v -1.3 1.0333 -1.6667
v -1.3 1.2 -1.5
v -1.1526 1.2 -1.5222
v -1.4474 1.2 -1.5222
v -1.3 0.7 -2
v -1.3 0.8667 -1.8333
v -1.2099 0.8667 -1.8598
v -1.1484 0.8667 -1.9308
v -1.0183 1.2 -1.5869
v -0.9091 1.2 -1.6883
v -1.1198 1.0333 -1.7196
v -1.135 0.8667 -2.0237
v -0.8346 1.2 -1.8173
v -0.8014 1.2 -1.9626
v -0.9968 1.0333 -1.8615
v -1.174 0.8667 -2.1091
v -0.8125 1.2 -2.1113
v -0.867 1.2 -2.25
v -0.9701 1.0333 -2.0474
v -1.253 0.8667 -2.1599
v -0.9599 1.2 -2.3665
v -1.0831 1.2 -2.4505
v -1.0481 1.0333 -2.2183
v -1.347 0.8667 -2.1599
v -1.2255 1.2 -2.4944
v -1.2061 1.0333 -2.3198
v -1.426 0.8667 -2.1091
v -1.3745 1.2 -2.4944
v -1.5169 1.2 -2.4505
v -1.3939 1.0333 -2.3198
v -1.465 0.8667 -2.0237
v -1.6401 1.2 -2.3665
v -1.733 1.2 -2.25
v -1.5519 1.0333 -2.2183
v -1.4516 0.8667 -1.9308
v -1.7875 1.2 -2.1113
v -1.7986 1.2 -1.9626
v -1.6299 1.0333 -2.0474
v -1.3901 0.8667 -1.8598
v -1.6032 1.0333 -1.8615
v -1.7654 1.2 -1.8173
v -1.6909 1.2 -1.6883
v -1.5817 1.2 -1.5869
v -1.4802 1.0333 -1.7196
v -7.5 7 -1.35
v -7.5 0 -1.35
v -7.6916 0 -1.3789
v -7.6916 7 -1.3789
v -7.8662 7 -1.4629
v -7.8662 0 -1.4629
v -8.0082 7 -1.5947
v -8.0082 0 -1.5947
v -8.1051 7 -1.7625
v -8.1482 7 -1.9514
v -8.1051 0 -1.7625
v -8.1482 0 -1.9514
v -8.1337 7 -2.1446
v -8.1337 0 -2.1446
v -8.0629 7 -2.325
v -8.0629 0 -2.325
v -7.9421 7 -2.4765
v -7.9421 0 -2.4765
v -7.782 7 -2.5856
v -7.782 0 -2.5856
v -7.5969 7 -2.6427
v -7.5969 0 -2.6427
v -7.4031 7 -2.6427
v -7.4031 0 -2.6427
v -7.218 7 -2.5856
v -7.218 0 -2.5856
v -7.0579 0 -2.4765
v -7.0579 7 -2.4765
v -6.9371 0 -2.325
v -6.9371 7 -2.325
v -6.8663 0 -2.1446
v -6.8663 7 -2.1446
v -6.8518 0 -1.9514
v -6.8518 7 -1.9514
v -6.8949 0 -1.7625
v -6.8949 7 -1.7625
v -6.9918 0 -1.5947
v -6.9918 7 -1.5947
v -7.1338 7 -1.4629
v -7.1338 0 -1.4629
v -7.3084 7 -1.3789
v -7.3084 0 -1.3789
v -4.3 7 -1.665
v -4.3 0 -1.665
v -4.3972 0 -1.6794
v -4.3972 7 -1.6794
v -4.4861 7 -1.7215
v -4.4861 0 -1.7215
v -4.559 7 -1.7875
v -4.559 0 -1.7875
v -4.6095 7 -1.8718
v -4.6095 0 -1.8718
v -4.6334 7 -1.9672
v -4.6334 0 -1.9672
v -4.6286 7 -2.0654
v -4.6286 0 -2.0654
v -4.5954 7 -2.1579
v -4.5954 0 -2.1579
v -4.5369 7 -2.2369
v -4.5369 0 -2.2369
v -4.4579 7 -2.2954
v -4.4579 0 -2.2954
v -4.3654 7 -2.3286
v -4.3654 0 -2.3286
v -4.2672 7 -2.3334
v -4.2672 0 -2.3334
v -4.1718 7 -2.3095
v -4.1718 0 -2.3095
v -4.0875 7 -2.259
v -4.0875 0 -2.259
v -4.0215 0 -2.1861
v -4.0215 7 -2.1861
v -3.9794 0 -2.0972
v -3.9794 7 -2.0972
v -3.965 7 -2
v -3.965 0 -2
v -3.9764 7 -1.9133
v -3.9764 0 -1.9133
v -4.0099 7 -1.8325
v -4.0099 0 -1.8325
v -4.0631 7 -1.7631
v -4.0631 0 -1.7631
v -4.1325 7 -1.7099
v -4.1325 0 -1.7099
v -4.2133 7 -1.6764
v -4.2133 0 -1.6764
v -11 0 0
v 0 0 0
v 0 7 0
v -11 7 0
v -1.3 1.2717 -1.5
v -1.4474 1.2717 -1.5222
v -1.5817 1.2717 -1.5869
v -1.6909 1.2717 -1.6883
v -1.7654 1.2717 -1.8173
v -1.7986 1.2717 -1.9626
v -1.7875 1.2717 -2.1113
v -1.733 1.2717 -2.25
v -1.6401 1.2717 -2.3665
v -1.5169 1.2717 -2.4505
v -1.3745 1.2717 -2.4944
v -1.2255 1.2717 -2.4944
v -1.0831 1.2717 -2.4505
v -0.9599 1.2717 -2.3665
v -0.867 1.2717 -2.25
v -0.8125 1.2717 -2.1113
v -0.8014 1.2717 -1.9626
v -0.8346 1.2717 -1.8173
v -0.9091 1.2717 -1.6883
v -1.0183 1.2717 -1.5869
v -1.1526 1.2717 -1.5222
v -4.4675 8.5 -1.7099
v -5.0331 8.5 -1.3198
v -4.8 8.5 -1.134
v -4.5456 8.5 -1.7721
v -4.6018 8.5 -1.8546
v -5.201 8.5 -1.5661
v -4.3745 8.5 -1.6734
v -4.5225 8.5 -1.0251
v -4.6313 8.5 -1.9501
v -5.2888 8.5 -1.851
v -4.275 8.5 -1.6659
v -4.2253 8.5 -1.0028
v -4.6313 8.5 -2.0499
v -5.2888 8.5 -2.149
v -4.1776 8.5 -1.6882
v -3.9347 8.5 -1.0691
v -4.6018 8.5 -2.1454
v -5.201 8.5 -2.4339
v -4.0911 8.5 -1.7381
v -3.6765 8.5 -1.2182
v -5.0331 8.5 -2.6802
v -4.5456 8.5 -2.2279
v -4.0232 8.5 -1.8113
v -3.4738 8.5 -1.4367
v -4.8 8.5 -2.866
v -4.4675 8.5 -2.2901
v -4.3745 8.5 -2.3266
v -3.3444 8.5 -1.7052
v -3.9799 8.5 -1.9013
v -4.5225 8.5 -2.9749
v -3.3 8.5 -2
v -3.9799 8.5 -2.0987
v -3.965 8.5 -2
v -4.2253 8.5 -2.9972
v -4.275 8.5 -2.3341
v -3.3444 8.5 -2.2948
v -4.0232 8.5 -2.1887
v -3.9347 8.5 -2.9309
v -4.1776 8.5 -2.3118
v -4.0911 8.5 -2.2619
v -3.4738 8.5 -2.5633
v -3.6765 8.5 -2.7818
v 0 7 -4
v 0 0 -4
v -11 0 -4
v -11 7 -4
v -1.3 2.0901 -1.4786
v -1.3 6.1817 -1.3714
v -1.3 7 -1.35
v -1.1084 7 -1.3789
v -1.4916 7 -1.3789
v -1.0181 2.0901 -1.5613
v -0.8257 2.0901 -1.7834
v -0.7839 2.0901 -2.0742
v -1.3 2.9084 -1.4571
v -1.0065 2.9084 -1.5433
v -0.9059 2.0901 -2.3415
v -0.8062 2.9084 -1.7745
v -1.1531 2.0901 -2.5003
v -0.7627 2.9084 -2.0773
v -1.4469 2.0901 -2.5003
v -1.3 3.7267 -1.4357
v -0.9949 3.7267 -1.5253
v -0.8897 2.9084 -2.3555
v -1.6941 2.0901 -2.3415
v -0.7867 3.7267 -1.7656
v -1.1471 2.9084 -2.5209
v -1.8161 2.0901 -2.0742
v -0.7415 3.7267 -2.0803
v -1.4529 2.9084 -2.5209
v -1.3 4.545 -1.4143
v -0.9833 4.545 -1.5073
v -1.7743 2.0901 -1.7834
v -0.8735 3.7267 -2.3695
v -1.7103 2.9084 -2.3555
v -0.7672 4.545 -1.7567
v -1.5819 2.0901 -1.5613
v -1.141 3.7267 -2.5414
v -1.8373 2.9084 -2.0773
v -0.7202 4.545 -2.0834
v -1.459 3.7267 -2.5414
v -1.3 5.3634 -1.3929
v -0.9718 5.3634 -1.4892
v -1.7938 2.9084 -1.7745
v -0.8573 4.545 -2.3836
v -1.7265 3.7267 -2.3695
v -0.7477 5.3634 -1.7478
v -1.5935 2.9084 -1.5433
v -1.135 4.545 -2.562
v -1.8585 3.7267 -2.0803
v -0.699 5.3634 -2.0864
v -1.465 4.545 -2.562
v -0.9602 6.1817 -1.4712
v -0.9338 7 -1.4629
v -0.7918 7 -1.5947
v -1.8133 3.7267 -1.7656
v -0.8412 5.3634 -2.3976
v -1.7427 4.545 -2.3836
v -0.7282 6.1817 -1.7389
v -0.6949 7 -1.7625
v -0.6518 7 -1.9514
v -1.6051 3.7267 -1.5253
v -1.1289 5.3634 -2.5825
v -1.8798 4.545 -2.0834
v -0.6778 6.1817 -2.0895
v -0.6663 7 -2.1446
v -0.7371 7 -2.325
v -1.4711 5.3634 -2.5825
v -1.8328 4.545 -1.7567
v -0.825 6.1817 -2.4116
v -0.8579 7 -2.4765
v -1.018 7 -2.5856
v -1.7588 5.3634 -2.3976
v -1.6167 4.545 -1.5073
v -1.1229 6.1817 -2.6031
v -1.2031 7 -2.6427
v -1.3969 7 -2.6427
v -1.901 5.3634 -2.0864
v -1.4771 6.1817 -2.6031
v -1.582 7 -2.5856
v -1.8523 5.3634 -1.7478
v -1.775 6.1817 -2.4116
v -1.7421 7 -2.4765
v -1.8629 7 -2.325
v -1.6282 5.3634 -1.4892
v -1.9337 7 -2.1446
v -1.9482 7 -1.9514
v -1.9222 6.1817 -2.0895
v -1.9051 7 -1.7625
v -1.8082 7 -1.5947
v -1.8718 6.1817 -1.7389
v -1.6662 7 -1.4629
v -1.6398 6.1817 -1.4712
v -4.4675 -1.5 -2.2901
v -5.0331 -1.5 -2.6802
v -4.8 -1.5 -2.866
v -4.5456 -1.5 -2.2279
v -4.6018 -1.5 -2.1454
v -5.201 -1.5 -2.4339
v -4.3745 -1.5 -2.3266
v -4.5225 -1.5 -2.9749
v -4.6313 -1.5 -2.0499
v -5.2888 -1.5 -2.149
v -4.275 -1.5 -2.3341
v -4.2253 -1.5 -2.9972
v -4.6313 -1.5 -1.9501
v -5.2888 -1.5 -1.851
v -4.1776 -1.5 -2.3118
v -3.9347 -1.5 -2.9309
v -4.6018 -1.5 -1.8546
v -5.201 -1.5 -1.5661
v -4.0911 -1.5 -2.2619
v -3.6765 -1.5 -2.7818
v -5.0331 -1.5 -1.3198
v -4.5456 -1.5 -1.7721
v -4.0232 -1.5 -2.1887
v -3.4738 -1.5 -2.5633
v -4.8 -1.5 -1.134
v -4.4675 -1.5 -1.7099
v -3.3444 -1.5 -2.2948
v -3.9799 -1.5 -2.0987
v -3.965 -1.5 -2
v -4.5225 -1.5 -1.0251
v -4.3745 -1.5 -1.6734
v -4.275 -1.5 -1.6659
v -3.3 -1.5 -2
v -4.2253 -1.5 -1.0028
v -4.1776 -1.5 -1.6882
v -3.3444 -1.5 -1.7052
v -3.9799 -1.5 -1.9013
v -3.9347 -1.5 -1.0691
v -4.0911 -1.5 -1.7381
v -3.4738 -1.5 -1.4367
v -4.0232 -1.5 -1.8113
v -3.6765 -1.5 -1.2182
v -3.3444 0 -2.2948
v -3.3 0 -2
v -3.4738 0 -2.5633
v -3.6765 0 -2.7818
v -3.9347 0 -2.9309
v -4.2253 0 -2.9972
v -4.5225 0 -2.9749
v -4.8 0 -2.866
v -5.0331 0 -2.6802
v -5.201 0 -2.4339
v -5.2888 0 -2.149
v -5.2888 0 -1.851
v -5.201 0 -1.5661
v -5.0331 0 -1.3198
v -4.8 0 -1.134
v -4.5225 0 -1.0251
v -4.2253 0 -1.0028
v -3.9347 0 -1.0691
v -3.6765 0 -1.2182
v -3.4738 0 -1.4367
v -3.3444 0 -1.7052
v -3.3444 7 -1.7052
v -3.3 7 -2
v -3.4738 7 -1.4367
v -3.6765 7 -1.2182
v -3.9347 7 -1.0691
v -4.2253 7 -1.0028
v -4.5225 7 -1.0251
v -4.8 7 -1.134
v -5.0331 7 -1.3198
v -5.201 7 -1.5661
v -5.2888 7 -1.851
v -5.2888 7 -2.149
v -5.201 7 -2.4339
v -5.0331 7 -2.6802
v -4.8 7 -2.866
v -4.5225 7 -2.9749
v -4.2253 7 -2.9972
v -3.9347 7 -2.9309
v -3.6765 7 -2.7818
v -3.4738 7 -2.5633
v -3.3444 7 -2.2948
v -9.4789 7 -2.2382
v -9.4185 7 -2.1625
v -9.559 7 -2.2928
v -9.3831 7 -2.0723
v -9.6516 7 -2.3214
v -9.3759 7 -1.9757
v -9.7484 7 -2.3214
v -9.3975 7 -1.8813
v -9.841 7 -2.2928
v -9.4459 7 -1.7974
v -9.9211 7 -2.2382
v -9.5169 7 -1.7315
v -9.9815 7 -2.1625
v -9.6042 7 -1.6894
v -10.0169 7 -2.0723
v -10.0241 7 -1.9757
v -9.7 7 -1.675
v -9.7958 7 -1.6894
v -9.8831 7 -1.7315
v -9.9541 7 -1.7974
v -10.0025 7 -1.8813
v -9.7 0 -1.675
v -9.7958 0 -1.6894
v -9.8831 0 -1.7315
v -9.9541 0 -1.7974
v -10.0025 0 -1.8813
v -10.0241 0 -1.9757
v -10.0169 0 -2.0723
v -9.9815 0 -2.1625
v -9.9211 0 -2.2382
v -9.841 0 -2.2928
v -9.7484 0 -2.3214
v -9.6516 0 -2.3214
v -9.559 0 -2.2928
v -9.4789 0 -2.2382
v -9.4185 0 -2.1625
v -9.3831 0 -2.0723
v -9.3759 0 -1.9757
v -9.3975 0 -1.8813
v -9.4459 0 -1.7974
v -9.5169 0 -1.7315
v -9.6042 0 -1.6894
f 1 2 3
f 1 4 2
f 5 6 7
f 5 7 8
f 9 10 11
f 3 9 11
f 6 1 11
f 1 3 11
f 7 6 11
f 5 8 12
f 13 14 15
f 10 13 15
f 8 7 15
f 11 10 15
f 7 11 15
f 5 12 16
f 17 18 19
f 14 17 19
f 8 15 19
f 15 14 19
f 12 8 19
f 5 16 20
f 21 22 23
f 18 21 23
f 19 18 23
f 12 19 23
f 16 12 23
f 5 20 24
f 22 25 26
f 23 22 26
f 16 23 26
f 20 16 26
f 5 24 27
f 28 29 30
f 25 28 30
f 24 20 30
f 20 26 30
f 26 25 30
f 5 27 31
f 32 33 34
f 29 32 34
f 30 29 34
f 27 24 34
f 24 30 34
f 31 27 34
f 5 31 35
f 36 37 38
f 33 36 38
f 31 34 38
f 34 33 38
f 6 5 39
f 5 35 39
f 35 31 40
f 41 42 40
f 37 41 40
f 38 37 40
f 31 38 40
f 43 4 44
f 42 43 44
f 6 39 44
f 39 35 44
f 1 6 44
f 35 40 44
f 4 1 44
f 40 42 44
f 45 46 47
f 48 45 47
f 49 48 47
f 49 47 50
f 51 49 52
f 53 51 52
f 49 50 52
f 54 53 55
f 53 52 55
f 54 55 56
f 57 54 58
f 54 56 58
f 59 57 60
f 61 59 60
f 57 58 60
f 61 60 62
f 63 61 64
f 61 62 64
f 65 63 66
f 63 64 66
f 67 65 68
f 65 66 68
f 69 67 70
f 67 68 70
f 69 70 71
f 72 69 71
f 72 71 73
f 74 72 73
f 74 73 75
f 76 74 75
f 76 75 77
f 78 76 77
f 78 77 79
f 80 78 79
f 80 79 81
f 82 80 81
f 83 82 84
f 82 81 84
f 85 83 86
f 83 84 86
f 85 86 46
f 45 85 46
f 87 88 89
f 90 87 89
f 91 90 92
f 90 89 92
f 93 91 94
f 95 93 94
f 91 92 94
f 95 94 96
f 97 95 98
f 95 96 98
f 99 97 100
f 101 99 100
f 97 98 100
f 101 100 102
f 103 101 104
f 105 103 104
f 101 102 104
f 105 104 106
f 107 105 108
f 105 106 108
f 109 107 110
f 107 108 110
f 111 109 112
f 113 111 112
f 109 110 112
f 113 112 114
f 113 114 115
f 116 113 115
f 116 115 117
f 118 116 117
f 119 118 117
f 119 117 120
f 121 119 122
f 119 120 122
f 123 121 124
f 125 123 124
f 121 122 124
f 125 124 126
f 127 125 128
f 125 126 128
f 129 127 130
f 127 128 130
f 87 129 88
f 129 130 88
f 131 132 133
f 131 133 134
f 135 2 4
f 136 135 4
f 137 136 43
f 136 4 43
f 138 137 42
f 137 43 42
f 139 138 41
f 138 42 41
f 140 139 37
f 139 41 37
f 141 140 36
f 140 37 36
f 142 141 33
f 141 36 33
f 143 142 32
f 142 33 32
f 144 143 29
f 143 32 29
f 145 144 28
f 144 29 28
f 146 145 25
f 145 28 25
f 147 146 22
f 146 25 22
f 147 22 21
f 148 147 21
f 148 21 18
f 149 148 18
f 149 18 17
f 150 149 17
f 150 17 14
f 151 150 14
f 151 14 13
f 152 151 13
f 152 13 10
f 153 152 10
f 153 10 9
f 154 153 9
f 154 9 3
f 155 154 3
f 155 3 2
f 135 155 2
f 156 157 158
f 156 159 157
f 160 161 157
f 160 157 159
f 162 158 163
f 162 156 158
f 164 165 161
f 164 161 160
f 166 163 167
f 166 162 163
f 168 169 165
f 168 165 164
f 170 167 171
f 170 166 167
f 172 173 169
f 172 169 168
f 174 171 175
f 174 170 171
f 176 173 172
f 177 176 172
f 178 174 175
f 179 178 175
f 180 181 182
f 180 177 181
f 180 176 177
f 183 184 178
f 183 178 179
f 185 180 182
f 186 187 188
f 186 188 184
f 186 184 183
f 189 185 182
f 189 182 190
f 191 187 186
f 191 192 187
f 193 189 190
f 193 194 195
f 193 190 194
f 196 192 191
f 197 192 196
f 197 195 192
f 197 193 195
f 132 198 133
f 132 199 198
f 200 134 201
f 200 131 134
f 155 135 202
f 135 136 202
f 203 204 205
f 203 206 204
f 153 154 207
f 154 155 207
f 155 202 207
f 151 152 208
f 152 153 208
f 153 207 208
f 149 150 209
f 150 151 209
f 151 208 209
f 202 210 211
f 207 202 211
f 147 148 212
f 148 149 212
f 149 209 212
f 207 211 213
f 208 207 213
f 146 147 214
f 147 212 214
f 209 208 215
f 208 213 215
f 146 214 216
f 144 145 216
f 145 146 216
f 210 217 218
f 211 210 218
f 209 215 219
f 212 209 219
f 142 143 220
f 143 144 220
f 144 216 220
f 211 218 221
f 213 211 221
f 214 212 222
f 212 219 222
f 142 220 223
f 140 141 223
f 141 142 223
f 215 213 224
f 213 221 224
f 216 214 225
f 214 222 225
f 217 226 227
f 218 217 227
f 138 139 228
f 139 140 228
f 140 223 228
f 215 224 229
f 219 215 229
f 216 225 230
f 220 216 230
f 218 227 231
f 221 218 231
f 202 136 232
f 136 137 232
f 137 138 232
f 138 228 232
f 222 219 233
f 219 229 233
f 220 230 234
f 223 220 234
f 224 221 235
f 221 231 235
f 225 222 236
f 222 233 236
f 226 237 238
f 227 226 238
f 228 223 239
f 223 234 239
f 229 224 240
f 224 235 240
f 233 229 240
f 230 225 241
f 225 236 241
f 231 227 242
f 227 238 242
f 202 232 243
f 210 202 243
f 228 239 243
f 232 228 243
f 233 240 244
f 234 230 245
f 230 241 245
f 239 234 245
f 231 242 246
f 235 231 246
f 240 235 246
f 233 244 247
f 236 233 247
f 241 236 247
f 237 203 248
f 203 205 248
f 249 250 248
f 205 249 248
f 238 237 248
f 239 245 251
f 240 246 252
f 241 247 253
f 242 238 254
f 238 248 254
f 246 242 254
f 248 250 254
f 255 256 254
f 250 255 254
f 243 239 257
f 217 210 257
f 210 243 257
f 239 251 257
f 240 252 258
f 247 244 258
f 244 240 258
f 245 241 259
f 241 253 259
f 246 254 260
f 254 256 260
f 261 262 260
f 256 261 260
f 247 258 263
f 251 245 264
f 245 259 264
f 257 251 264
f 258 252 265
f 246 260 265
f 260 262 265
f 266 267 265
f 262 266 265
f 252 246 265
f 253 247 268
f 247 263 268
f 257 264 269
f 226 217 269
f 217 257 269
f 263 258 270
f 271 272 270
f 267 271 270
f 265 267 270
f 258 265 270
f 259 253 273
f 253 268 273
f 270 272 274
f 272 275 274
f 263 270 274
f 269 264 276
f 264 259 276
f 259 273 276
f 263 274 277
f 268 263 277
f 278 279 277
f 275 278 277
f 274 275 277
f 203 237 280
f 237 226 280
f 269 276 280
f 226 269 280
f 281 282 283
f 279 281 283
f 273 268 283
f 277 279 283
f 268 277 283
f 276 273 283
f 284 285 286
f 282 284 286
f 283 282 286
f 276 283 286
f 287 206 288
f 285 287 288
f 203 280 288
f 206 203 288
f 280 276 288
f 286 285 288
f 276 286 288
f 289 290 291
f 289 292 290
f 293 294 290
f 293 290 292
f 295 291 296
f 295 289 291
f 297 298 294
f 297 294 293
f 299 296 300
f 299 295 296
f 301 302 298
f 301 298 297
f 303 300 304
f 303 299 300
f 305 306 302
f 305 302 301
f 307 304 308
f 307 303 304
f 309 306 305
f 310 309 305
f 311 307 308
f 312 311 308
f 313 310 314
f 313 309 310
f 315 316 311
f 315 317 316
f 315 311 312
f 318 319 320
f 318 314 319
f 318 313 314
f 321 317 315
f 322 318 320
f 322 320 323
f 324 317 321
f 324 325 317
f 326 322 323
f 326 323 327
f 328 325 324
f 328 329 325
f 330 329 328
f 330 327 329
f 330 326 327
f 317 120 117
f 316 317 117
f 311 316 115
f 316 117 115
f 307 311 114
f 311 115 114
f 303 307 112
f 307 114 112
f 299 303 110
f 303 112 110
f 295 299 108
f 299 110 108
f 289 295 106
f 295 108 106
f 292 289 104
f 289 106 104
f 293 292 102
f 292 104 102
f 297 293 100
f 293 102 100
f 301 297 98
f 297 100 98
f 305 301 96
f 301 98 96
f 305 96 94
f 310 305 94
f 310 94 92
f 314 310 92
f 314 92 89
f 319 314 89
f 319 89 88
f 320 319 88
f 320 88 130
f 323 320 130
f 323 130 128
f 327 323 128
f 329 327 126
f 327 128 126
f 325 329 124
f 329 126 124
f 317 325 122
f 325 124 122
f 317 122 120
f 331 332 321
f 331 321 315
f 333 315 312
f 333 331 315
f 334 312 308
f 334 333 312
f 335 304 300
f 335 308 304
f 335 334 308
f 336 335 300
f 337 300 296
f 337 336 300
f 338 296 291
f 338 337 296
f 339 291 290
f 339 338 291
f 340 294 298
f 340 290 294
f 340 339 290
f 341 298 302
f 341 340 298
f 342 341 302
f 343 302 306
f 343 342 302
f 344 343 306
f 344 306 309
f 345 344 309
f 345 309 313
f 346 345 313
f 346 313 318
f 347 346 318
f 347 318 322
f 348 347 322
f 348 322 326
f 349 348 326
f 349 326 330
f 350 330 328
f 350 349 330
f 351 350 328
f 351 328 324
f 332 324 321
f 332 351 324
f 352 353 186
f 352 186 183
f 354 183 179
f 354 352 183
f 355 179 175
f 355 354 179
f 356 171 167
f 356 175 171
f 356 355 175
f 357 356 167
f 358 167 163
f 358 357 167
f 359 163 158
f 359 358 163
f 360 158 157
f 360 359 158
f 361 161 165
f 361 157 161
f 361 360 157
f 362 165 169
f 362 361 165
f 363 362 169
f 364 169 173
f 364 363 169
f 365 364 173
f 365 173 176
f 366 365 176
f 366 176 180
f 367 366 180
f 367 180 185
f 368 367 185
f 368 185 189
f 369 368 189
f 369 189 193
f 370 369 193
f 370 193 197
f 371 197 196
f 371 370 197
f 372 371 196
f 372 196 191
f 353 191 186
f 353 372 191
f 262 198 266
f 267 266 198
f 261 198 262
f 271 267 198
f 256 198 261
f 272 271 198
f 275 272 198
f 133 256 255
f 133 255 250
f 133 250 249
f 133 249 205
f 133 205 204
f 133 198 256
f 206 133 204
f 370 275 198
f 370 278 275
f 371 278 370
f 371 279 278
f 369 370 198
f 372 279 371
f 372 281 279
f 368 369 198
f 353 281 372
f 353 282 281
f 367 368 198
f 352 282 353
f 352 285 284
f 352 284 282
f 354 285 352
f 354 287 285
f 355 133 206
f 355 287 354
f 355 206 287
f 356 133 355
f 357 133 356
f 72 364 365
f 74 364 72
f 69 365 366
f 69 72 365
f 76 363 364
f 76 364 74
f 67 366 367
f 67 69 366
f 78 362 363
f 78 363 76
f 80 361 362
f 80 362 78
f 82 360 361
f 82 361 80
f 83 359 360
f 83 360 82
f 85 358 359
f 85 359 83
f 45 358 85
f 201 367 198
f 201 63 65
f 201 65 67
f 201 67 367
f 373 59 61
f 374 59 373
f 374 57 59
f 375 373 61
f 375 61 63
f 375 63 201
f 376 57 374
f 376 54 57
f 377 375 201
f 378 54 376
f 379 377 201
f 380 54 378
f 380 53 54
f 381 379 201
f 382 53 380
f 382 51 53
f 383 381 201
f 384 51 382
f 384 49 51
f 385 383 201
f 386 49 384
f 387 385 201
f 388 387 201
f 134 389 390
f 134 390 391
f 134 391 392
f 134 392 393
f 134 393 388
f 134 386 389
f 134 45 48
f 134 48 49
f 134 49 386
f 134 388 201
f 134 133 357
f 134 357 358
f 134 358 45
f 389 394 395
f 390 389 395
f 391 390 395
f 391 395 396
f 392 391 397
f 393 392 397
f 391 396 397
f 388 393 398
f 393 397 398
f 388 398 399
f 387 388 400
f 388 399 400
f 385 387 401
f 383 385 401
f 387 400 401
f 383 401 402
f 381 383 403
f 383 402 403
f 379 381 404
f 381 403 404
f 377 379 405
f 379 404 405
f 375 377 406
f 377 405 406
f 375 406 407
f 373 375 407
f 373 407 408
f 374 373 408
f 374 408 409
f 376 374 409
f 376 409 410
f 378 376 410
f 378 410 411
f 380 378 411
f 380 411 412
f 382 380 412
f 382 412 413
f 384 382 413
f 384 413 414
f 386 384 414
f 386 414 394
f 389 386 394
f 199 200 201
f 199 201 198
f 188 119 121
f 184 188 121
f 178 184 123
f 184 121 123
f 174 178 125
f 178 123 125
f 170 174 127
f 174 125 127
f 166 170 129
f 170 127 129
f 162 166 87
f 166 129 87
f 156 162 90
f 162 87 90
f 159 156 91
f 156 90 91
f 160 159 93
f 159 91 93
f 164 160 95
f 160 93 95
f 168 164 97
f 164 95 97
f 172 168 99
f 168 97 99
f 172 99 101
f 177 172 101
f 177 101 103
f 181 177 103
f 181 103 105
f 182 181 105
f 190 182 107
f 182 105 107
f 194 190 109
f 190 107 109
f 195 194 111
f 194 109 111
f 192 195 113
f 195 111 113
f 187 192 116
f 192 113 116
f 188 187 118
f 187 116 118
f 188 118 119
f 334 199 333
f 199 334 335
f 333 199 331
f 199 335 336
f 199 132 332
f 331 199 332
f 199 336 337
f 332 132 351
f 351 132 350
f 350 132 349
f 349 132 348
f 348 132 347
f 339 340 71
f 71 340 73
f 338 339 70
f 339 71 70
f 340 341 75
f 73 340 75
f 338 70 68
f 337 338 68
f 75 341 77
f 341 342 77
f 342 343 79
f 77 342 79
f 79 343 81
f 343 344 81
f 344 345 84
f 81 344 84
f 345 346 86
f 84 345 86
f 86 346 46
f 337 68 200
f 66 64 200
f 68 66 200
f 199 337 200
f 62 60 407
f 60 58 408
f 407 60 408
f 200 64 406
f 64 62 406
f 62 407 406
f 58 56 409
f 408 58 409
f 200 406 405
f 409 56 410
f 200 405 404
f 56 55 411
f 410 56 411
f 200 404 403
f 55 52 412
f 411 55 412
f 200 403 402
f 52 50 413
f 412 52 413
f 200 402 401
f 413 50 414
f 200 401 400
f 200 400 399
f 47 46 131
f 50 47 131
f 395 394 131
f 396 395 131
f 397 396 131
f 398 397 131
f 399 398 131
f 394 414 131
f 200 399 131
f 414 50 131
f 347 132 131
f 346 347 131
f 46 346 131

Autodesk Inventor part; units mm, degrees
ref_plane "YZ Plane" through (0, 0, 0) normal (1, 0, 0) x (0, 1, 0)
ref_plane "XZ Plane" through (0, 0, 0) normal (0, 1, 0) x (-1, 0, 0)
ref_plane "XY Plane" through (0, 0, 0) normal (0, 0, 1) x (1, 0, 0)
sketch "스케치1" plane through (0, 0, 0) normal (0, 1, 0) x (-1, 0, 0)
  line L0 (0, 0) -> (11, 0)
  line L1 (11, 0) -> (11, -4)
  line L2 (11, -4) -> (0, -4)
  line L3 (0, -4) -> (0, 0)
  dimension "d0" = 11
  dimension "d1" = 4
extrude "돌출1" add sketch "스케치1" along normal blind 7
sketch "스케치2" plane through (0, 7, 0) normal (0, 1, 0) x (1, 0, 0)
  line L0 (0, 0) -> (0, 4) construction
  line L1 (0, 2) -> (-11, 2) construction
  line L2 (-11, 4) -> (-11, 0) construction
  point P0 (-1.3, 2)
  point P1 (-4.3, 2)
  point P2 (-7.5, 2)
  point P3 (-9.7, 2)
  point P4 (-4.3, 2)
  dimension "d59" = 1.3
  dimension "d60" = 2.2
  dimension "d61" = 3.2
  dimension "d62" = 1.3
  dimension "d69" = 0
hole "구멍1" at (-9.7, 7, -2) direction (0, -1, 0) diameter 0.65 end through all
hole "구멍2" at (-7.5, 7, -2) direction (0, -1, 0) diameter 1.3 end through all
hole "구멍3" at (-4.3, 7, -2) direction (0, -1, 0) diameter 0.67 end through all
hole "구멍4" at (-1.3, 7, -2) direction (0, -1, 0) diameter 1 depth 5.8 tip angle 90 countersink diameter 1.3 countersink angle 3
sketch "스케치3" plane through (0, 7, 0) normal (0, 1, 0) x (1, 0, 0)
  circle A0 centre (-4.3, 2) radius 1
  circle A1 centre (-4.3, 2) radius 0.335 projected
  point P0 (0, 0)
  point P1 (-4.3, 2)
  dimension "d50" = 2
extrude "돌출2" add sketch "스케치3" along normal blind 1.5
sketch "스케치4" plane through (0, 0, 0) normal (0, -1, 0) x (1, 0, 0)
  circle A0 centre (-4.3, -2) radius 1
  circle A1 centre (-4.3, -2) radius 0.335 projected
  point P0 (0, 0)
  point P1 (-4.3, -2)
  dimension "d53" = 2
extrude "돌출3" add sketch "스케치4" along normal blind 1.5
sketch "스케치5" plane through (0, 0, -4) normal (0, 0, -1) x (-1, 0, 0)
  point P0 (0, 0)
equation "\"d8\" = G23_F"
equation "\"d15\" = Screw_F"
equation "\"d22\" = G23_M"
equation "\"G23_F\" = 0.65"
equation "\"G23_M\" = 0.67"
equation "\"Screw_F\" = 1.3"
equation "\"Screw_M\" = 1.6"
properties part number "BOt"
